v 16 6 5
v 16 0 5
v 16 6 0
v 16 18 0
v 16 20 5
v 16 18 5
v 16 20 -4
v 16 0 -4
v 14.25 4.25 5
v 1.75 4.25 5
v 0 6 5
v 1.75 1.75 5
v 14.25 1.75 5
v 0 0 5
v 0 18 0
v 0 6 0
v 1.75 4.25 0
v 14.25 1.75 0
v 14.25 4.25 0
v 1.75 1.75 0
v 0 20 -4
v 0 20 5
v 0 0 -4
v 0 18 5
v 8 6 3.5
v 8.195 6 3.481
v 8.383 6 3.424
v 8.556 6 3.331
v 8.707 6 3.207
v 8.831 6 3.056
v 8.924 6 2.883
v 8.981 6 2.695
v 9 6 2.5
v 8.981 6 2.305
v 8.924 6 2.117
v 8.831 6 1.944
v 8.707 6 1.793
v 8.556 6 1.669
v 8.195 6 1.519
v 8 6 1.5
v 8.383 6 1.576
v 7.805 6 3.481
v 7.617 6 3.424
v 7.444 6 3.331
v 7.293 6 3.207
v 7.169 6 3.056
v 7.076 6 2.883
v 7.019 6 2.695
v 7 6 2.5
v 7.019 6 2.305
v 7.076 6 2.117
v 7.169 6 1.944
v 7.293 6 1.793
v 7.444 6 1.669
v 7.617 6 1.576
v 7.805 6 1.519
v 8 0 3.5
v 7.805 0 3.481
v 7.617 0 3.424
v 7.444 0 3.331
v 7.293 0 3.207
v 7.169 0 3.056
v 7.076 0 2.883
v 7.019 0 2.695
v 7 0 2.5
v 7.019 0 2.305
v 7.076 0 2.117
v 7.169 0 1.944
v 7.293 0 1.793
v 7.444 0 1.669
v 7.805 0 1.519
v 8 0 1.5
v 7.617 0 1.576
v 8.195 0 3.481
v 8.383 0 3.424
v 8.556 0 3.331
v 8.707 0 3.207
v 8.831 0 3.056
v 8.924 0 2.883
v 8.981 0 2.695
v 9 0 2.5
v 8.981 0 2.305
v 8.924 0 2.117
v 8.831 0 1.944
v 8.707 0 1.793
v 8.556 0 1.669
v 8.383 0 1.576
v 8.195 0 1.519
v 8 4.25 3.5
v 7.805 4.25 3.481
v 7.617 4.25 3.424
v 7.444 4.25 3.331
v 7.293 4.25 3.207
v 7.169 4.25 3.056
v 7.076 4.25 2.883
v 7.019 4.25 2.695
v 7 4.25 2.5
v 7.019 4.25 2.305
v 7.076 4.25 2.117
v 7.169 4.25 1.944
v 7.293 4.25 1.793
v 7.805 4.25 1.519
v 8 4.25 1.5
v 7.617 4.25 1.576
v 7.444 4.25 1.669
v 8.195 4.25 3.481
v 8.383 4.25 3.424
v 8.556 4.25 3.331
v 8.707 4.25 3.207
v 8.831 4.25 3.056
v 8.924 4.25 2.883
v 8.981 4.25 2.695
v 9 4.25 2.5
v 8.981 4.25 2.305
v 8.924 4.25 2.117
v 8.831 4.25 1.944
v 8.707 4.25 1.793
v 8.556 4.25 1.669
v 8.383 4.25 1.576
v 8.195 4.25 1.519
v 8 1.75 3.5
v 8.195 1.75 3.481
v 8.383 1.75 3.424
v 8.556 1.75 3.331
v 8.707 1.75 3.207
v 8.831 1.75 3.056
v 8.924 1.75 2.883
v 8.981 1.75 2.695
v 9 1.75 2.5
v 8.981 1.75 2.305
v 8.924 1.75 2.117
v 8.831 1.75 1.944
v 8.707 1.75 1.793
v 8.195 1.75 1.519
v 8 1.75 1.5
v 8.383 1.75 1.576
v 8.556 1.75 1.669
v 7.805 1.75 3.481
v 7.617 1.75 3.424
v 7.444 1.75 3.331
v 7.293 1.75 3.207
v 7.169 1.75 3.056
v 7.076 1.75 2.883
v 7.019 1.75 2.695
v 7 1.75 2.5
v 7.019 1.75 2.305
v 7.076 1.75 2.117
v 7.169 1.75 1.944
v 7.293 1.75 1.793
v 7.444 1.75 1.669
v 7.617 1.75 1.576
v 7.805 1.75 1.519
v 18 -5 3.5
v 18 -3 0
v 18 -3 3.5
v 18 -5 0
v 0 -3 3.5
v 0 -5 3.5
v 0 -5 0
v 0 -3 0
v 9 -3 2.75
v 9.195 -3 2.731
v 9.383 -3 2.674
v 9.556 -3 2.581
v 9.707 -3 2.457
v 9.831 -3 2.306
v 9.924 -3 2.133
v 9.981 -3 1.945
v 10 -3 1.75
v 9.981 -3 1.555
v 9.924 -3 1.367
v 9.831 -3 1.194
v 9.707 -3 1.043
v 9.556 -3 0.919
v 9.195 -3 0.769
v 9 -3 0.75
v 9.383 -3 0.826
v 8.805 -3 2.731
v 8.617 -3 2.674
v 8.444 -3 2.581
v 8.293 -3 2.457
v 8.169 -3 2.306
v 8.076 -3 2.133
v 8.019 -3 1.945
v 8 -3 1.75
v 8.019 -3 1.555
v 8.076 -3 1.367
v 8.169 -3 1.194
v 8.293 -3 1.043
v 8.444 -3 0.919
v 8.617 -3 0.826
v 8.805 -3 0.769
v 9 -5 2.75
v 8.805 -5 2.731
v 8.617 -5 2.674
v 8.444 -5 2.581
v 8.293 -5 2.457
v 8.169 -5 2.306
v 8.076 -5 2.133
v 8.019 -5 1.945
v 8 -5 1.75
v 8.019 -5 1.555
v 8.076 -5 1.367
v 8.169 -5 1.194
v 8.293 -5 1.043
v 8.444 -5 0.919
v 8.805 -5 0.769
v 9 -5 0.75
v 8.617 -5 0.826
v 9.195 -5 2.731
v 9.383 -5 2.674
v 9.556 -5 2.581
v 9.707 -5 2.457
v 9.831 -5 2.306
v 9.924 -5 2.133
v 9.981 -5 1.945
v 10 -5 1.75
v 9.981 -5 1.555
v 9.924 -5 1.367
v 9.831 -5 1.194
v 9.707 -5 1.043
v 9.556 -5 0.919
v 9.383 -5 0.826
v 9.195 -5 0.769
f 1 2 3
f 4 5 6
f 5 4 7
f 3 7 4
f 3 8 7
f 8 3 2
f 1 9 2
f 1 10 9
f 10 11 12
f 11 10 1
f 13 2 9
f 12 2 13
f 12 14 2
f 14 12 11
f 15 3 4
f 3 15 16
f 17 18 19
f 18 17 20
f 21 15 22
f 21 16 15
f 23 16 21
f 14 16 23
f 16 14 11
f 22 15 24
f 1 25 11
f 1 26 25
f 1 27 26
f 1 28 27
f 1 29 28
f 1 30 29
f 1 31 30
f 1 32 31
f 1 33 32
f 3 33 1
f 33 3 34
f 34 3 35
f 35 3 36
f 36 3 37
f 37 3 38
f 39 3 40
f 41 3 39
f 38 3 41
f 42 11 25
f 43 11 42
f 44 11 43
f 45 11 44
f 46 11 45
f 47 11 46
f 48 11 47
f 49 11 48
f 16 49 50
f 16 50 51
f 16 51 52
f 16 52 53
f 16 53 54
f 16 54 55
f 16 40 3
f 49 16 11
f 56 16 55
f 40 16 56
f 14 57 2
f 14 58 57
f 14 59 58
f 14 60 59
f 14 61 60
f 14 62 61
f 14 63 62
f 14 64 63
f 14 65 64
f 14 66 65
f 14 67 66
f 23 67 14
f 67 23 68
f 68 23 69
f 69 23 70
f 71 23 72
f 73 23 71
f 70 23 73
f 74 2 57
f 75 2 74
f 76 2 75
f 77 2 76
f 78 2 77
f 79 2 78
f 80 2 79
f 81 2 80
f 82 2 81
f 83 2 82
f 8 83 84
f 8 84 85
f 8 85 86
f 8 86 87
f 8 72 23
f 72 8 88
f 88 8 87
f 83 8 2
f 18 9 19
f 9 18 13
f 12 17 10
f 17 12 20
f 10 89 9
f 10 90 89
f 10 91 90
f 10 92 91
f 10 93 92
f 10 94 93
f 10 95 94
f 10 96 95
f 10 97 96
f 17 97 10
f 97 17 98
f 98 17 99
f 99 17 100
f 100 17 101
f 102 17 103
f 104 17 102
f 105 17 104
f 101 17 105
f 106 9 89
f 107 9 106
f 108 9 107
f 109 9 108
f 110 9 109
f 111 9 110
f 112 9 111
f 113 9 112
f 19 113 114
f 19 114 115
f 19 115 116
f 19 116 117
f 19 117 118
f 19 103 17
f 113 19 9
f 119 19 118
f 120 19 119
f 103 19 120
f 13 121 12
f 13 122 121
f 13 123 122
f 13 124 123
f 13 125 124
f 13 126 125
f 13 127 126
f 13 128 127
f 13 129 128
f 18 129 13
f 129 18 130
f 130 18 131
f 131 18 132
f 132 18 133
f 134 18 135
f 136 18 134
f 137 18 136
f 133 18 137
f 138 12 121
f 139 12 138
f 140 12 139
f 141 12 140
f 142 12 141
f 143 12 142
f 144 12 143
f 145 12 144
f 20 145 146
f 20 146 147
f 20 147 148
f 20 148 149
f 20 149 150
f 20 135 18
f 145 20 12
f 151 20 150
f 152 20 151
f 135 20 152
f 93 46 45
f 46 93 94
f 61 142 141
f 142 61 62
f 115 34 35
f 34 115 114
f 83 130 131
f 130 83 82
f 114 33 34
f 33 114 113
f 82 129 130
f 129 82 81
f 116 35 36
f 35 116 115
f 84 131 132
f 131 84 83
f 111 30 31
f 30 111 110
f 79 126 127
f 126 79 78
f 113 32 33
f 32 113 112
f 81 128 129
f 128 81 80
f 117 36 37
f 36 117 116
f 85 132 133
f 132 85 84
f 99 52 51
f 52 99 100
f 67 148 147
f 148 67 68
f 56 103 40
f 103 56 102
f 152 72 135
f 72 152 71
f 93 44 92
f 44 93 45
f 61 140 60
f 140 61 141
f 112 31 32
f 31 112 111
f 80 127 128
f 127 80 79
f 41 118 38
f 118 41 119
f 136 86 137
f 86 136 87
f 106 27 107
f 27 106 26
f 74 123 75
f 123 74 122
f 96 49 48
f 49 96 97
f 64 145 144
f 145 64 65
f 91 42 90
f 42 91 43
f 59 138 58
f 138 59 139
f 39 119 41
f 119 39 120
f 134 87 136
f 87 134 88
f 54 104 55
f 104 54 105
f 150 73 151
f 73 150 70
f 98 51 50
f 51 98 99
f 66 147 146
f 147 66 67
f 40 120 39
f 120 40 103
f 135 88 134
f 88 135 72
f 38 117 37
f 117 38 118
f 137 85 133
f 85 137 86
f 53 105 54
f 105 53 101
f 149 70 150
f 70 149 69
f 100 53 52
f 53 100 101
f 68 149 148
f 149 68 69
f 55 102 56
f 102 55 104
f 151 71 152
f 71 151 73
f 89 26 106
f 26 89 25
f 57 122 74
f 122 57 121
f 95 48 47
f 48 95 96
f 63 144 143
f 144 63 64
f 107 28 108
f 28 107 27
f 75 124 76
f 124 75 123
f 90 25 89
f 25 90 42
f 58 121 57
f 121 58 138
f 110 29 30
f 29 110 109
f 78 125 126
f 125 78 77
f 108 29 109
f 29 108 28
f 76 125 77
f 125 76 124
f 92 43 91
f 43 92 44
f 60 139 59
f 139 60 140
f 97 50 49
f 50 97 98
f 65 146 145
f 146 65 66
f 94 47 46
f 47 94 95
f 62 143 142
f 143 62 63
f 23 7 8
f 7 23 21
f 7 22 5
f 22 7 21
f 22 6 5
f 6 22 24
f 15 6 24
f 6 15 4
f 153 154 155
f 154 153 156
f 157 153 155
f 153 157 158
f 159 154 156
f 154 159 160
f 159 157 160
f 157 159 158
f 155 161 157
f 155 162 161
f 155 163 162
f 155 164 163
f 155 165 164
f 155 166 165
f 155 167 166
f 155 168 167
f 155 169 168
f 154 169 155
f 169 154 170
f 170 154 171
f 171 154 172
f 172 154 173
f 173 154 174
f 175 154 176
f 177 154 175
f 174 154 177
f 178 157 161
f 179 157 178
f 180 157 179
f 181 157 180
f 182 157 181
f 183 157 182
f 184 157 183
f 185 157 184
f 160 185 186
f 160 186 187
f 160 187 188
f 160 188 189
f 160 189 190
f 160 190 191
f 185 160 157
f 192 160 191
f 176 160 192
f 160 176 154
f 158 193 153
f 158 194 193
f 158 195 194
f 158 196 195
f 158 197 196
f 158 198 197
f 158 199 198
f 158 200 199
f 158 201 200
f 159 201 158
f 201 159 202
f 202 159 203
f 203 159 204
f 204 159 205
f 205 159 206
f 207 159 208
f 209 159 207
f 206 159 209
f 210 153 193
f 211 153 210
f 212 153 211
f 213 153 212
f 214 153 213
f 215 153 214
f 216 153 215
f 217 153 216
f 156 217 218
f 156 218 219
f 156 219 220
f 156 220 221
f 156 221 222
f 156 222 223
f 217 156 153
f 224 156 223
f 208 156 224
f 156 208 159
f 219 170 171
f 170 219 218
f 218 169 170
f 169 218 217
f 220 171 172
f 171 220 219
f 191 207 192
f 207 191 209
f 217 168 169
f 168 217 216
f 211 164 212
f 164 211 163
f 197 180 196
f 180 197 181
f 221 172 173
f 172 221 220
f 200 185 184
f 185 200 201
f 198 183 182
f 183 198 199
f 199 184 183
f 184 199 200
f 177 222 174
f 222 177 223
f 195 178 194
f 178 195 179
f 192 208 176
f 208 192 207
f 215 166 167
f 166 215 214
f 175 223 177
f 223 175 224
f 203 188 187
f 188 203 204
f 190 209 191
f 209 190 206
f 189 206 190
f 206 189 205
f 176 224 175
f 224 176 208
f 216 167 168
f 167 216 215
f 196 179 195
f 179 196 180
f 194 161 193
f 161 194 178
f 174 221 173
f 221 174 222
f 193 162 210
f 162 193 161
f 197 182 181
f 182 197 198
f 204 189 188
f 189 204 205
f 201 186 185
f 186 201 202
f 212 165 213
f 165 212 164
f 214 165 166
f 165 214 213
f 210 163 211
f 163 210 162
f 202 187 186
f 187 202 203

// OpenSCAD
servoMount();
translate([0,-5,0]) servoMountClip();

module servoMount() {
  difference() {
    cube([16,6,5]);
    translate([1.75,1.75,-0.1]) cube([12.5,2.5,5.2]);
    translate([8,-1,2.5]) rotate([-90,0,0]) cylinder(r=1,h=10, $fn=32);
  }

  translate([0,0,-4]) cube([16,20,4]);
  translate([0,18,0]) cube([16,2,5]);
}

module servoMountClip() {
  difference() { 
    cube([18,2,3.5]);
    translate([9,-1,1.75]) rotate([-90,0,0]) cylinder(r=1,h=10, $fn=32);
  }
}
